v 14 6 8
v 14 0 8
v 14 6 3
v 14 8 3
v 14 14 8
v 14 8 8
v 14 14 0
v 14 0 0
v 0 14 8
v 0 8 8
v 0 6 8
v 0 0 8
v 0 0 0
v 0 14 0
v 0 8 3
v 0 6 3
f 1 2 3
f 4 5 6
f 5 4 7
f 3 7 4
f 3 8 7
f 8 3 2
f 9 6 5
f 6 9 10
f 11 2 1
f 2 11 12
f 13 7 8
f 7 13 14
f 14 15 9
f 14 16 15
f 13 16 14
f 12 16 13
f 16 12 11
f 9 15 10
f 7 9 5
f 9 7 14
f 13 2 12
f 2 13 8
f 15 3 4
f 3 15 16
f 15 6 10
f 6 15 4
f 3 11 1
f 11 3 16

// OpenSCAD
$fn = 32;

// ----------------------------------------------------------------------
// Micro clip: slotted block, 5-20 mm class
// ----------------------------------------------------------------------

// --- parameters (mm) ---
block_l = 14;             // block length, X
block_w = 14;             // block width, Y
block_h = 8;              // block height, Z
slot_w = 2;               // slot width
slot_d = 5;               // slot depth from the top

difference() {
  cube([block_l, block_w, block_h]);
  translate([-1, block_w / 2 - slot_w / 2, block_h - slot_d])
    cube([block_l + 2, slot_w, slot_d + 1]);
}
